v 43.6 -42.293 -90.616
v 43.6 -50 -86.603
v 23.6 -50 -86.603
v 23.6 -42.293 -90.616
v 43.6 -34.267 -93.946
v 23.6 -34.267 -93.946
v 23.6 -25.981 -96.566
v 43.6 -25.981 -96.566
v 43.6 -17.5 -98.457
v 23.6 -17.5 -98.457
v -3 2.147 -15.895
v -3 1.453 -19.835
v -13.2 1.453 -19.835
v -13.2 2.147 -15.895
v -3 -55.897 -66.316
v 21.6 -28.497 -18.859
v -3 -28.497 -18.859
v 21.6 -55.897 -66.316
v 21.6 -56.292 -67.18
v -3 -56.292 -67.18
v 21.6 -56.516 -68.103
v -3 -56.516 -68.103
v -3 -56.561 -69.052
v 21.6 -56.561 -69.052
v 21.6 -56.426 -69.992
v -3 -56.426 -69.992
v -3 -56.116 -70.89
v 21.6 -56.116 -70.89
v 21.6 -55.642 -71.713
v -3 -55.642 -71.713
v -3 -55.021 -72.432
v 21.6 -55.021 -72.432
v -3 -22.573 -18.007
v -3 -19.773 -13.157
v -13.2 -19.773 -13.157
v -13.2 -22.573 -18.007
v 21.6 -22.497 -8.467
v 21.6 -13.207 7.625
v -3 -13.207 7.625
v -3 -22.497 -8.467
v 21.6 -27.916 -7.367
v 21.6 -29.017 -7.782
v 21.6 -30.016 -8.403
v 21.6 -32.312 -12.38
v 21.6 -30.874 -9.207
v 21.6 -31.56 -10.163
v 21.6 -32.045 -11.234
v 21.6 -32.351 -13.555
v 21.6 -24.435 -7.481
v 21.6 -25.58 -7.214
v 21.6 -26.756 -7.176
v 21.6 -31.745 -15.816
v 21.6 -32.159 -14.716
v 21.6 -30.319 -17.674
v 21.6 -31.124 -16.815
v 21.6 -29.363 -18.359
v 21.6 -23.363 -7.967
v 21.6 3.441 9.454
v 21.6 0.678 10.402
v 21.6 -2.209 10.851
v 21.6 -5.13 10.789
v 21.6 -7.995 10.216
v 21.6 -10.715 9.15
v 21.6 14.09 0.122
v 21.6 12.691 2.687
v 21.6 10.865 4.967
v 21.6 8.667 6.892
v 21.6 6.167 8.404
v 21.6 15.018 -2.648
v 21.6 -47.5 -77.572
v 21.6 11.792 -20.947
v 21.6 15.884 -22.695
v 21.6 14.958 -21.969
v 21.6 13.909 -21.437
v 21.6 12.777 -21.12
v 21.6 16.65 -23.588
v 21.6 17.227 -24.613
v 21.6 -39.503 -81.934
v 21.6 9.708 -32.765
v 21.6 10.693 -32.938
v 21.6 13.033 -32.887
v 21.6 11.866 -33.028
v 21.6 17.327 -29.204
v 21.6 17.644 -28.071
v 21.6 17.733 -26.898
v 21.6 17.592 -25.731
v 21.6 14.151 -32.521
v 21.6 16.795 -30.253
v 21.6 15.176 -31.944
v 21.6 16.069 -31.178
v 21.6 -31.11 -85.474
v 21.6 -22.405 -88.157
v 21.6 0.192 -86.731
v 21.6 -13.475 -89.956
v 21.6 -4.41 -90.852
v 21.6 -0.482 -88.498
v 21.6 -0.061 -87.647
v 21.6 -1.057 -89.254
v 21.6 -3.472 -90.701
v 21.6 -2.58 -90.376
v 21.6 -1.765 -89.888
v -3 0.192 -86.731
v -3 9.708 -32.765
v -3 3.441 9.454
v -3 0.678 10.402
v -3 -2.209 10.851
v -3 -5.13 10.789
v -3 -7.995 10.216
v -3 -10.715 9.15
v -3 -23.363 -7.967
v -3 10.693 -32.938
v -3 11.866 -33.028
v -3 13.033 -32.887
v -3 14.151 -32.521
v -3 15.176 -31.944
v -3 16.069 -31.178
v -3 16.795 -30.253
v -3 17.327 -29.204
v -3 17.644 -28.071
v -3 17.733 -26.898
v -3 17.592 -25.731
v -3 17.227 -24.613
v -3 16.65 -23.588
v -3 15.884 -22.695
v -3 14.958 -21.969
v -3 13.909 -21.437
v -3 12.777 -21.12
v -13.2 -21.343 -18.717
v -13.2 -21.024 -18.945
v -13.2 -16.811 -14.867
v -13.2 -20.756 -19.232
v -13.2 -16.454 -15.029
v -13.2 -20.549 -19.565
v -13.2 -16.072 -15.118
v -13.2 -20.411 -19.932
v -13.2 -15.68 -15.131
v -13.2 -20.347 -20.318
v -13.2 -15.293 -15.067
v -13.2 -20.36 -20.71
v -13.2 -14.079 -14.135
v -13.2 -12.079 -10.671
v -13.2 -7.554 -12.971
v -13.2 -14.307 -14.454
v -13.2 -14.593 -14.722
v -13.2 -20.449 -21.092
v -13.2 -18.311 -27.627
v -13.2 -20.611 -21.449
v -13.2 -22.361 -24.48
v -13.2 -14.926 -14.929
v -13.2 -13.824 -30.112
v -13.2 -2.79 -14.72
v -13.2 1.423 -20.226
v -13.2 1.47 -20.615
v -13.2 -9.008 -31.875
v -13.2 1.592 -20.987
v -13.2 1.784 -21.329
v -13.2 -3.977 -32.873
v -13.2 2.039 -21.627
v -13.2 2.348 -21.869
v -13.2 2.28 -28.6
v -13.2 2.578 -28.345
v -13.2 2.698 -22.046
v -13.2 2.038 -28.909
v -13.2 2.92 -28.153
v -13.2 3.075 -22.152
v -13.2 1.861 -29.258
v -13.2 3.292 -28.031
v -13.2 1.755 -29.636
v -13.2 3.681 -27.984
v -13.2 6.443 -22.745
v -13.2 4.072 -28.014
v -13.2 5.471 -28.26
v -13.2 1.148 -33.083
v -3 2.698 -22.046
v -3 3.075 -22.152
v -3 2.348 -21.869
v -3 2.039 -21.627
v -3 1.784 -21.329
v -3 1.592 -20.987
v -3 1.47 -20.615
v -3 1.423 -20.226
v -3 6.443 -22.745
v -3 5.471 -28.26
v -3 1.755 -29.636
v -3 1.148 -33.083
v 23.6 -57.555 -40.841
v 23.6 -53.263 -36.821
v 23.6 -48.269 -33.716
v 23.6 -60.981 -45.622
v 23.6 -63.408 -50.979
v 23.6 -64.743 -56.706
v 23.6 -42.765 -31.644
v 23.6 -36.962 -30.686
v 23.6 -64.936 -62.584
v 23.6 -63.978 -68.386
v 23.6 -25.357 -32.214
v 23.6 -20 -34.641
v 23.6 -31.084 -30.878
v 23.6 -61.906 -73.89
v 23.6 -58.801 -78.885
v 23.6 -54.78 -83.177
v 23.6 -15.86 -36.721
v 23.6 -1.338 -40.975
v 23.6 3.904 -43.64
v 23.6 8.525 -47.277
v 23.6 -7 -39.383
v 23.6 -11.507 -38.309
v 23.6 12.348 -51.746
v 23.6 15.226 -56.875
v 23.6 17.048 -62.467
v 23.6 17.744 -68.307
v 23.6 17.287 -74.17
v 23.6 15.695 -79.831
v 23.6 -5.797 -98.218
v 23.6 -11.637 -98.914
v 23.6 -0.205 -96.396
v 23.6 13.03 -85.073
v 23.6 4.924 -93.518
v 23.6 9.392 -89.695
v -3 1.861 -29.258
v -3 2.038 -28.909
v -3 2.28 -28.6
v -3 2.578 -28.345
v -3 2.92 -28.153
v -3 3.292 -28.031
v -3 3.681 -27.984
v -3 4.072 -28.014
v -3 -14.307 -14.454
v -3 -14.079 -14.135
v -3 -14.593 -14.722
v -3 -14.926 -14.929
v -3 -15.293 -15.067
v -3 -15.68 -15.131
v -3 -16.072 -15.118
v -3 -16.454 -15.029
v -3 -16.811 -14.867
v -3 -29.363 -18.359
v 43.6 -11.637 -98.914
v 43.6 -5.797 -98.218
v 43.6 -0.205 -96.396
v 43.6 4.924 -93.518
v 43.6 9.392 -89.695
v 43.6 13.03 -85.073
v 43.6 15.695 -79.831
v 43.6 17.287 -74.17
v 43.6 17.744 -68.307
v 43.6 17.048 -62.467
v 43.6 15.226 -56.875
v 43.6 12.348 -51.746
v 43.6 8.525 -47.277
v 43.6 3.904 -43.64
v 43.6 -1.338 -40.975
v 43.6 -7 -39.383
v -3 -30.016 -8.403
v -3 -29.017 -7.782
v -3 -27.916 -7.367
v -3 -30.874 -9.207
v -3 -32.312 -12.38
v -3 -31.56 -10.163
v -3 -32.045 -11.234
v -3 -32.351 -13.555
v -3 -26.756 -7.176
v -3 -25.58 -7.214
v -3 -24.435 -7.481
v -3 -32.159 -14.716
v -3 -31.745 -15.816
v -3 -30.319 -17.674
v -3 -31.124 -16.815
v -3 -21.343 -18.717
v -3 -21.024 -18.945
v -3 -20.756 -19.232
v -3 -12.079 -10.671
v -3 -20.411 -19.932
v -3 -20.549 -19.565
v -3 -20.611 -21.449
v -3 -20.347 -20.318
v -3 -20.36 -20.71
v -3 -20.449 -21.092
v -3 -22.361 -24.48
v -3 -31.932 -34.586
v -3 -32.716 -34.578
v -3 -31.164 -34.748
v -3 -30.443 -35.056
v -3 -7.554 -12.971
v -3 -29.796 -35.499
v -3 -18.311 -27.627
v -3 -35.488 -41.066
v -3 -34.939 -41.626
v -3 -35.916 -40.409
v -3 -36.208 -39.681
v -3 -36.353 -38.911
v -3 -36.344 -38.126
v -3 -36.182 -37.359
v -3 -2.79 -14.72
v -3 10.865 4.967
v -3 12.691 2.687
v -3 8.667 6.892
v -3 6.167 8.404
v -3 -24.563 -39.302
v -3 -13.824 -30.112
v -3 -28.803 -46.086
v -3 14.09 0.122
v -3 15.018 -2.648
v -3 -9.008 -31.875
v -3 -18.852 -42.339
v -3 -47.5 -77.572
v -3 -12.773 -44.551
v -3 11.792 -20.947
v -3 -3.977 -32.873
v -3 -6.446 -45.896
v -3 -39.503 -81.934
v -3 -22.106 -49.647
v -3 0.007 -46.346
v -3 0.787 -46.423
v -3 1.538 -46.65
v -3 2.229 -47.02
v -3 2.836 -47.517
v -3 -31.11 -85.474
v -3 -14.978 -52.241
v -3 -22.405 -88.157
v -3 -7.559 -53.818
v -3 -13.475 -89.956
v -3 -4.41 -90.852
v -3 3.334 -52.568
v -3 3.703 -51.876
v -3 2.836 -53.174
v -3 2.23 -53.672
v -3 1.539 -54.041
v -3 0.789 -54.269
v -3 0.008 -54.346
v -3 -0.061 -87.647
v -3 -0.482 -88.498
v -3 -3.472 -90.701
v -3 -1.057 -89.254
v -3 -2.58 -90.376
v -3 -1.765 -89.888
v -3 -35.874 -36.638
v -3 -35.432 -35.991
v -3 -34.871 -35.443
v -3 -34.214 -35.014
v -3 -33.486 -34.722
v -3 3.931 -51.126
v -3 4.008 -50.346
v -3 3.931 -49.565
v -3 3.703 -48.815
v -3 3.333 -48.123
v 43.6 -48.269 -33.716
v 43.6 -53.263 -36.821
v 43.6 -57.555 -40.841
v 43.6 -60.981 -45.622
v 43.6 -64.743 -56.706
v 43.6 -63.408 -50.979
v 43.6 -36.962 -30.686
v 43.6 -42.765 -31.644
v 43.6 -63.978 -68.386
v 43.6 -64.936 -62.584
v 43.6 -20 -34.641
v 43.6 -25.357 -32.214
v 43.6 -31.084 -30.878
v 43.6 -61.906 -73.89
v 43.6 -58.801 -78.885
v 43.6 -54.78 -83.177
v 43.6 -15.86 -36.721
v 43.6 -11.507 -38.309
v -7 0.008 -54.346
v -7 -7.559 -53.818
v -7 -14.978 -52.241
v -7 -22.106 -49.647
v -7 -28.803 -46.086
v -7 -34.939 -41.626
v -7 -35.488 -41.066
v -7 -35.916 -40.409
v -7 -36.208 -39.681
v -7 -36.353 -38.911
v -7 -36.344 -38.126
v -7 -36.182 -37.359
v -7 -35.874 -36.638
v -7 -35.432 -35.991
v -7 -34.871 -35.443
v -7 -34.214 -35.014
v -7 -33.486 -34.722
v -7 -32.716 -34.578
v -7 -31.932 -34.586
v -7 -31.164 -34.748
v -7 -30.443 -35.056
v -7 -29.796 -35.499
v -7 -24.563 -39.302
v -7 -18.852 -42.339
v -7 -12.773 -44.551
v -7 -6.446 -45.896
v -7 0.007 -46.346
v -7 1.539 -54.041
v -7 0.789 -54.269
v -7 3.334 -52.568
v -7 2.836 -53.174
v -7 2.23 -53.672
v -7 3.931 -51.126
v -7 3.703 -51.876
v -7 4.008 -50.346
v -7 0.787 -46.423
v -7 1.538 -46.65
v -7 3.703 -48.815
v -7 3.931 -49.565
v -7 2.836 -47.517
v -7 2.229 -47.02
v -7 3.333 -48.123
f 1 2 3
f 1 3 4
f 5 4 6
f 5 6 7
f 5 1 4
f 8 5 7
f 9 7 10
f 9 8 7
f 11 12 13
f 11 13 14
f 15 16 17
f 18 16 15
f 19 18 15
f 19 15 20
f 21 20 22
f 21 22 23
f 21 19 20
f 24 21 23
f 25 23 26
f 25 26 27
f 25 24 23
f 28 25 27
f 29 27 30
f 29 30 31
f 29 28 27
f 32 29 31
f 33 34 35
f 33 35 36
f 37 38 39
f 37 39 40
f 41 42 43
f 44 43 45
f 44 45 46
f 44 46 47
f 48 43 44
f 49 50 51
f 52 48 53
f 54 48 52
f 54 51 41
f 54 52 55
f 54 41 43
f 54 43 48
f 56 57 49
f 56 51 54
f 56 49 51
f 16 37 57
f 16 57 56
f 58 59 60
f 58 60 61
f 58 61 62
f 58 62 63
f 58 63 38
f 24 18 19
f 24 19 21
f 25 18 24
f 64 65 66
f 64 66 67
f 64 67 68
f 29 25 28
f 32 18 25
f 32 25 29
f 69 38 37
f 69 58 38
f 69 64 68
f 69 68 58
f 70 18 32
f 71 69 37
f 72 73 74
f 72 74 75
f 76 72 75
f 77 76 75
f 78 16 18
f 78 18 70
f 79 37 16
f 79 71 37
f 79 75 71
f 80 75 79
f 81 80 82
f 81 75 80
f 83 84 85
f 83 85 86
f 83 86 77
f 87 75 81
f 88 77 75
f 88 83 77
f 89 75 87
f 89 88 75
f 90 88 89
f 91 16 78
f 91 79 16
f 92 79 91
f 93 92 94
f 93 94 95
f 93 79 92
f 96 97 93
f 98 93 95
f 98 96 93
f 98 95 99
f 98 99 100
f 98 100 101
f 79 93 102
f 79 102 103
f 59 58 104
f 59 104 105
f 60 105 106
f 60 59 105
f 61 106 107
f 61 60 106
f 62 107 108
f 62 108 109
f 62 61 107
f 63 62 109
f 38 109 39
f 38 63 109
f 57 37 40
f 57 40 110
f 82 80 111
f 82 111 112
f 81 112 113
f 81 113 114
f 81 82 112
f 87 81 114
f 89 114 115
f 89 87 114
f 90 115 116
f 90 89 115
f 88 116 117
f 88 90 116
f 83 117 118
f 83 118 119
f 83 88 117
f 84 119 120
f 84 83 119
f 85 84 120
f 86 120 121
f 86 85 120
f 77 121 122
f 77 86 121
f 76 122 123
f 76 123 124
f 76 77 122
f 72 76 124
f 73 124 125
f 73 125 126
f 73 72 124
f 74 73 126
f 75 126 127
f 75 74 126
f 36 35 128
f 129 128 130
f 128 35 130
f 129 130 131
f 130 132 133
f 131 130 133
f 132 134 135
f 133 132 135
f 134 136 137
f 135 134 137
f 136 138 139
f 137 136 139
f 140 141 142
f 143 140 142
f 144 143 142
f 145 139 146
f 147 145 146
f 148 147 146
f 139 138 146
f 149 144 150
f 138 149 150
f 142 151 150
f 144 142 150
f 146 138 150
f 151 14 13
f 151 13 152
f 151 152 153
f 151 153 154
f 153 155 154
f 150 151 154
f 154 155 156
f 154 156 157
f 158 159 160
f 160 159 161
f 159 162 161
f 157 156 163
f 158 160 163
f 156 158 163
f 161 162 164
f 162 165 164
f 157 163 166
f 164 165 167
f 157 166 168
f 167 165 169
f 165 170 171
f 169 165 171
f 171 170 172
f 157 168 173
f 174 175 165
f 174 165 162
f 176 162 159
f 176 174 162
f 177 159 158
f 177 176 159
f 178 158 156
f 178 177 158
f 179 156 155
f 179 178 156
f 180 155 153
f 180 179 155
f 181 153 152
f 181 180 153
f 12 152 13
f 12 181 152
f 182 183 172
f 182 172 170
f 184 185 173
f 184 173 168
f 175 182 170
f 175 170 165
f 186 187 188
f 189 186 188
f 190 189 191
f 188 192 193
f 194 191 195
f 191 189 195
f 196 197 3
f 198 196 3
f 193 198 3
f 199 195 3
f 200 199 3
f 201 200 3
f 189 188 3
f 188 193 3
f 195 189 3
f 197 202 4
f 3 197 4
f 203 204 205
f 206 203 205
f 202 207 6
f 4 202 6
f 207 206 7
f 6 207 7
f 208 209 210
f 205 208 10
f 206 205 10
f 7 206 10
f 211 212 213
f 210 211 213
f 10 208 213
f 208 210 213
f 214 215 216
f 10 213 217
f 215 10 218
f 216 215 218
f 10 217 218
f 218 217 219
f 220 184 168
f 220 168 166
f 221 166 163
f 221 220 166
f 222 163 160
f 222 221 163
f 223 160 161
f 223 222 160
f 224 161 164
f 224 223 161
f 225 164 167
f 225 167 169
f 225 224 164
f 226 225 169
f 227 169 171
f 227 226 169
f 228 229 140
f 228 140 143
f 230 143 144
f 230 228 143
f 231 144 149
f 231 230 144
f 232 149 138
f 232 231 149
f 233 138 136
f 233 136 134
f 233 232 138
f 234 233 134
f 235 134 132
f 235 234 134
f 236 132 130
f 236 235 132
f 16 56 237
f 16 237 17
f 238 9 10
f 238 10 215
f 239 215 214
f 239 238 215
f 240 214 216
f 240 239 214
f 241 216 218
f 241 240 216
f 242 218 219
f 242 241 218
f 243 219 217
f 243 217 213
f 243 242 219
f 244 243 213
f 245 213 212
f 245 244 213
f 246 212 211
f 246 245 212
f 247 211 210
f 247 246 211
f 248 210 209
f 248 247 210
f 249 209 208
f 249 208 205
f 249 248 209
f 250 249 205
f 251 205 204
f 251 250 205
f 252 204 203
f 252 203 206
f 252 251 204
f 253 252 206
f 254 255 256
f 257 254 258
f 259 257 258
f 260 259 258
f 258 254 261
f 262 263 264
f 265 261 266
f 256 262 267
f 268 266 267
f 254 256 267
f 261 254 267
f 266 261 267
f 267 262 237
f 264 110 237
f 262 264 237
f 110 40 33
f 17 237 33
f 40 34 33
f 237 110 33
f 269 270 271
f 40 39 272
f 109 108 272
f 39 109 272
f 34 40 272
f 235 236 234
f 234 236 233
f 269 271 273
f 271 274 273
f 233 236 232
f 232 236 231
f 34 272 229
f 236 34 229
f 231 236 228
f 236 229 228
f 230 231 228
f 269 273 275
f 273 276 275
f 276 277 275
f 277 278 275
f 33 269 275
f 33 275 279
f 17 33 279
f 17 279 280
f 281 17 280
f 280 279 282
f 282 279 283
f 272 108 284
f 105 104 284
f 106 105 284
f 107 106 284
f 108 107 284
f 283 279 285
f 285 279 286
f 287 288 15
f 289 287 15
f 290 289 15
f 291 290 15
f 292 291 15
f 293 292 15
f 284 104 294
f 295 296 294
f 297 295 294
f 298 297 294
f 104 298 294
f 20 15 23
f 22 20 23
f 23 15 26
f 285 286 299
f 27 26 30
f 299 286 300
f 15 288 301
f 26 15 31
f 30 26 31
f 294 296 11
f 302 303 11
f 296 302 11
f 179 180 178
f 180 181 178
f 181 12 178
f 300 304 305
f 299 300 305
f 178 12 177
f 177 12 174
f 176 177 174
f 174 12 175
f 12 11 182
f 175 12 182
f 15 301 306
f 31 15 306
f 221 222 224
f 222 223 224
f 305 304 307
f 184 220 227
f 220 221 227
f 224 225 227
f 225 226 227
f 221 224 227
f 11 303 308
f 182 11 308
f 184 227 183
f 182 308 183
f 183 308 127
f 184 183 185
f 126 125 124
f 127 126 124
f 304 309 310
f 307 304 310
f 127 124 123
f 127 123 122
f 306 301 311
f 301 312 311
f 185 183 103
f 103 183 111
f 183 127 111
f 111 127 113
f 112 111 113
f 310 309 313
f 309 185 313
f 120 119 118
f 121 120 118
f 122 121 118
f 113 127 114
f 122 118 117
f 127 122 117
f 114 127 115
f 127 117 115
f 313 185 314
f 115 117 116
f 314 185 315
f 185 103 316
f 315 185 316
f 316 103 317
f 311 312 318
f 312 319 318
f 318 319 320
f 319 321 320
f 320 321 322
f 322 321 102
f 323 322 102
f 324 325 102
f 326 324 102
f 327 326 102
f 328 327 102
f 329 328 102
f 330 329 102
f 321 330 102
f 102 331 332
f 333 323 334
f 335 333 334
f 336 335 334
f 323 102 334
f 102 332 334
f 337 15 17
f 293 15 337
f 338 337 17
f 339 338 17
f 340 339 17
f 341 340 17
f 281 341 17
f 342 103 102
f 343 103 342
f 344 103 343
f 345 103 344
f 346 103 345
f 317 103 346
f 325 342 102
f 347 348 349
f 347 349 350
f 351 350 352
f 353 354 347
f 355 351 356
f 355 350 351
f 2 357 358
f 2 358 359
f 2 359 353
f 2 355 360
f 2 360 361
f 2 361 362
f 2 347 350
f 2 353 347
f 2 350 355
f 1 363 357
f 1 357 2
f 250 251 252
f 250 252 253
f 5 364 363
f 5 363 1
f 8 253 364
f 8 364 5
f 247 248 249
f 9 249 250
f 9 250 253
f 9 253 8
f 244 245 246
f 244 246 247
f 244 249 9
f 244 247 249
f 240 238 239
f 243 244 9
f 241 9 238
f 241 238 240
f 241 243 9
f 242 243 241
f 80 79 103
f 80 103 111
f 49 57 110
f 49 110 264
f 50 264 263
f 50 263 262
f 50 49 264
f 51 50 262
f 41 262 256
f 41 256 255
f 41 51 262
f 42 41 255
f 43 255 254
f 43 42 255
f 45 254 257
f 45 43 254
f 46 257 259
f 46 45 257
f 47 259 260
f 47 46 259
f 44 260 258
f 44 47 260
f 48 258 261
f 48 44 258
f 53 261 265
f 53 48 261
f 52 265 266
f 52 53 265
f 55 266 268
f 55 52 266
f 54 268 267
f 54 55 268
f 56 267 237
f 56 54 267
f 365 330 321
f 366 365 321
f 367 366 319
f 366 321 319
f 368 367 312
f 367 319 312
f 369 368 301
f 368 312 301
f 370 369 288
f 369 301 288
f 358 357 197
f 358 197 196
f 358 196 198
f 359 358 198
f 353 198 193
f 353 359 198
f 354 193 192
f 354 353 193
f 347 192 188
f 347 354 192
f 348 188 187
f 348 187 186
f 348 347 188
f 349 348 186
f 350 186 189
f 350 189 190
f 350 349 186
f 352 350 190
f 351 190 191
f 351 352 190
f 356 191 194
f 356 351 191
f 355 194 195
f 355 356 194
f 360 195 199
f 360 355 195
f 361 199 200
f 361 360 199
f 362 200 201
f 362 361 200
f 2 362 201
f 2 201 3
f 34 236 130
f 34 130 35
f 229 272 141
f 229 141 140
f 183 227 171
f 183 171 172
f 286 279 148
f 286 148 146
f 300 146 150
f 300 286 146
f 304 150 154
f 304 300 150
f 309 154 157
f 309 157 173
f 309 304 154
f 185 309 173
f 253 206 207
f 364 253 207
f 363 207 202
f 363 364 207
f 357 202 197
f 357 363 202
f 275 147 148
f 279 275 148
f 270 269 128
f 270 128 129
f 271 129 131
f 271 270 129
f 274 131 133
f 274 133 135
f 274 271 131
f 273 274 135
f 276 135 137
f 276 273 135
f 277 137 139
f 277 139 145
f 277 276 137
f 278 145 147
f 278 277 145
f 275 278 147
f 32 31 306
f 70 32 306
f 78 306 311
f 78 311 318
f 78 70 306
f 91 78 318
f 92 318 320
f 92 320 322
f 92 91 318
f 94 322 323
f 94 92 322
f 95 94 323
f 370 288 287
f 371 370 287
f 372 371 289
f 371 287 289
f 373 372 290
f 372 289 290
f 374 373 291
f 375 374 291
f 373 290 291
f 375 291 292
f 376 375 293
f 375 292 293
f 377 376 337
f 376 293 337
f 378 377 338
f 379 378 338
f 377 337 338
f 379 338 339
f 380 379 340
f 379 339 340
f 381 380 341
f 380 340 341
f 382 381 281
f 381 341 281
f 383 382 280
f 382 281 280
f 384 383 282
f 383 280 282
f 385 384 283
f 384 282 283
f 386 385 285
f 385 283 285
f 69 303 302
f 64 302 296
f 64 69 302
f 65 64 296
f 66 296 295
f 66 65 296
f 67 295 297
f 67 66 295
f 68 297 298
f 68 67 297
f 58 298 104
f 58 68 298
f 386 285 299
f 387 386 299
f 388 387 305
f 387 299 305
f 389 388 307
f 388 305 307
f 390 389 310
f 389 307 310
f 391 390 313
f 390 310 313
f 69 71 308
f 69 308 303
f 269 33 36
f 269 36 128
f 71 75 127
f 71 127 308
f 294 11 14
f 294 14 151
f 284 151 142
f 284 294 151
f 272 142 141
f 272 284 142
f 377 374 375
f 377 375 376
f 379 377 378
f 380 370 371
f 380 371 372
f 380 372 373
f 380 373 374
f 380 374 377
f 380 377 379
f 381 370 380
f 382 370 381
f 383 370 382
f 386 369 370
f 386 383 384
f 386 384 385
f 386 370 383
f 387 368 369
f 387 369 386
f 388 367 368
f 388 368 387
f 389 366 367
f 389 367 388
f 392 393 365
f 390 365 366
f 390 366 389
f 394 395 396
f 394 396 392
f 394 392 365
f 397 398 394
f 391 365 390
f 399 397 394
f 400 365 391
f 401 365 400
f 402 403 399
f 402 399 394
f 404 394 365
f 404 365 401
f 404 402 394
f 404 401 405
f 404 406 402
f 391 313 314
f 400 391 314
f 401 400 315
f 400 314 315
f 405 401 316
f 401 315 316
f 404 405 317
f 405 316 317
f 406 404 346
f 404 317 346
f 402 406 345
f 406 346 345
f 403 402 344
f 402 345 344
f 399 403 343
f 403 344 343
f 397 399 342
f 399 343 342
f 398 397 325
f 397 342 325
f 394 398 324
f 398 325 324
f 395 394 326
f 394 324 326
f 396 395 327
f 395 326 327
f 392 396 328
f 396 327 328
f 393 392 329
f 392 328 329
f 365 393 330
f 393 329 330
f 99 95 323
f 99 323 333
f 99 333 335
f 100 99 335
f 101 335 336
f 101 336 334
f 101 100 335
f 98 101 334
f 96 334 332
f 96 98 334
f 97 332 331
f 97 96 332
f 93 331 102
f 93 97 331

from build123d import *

# Parameters (mm, degrees)
BOSS_EXTRUDE2_DEPTH = 24.6
BOSS_EXTRUDE3_DEPTH = 4
BOSS_EXTRUDE4_DEPTH = 10.2
BOSS_EXTRUDE5_DEPTH = 20


with BuildPart() as part:
    # Sketch7 → Boss-Extrude2 (new body)
    with BuildSketch(Plane(origin=(21.6, 0, 0), x_dir=(0, 0, -1), z_dir=(1, 0, 0))):
        with BuildLine():
            Line((-7.625, -13.206887408), (8.466613981, -22.497385071))
            Line((8.466613981, -22.497385071), (7.966613981, -23.363410475))
            ThreePointArc((7.966613981, -23.363410475), (10.162766404, -31.559562898), (18.358918826, -29.363410475))
            Line((18.358918826, -29.363410475), (18.858918826, -28.497385071))
            Line((18.858918826, -28.497385071), (66.316248975, -55.896887408))
            ThreePointArc((66.316248975, -55.896887408), (69.52544748, -56.516208588), (72.431605073, -55.020627828))
            ThreePointArc((72.431605073, -55.020627828), (85.473848311, -31.109936594), (90.852406417, -4.409892086))
            ThreePointArc((90.852406417, -4.409892086), (89.587501324, -1.396168663), (86.731020662, 0.192236824))
            Line((86.731020662, 0.192236824), (32.764536002, 9.707984124))
            Line((32.764536002, 9.707984124), (32.93818418, 10.692791877))
            ThreePointArc((32.93818418, 10.692791877), (28.071226728, 17.643527461), (21.120491144, 12.776570009))
            Line((21.120491144, 12.776570009), (20.946842966, 11.791762256))
            Line((20.946842966, 11.791762256), (2.648134709, 15.018318233))
            ThreePointArc((2.648134709, 15.018318233), (-4.966977399, 10.864576659), (-9.454073405, 3.441001312))
            ThreePointArc((-9.454073405, 3.441001312), (-10.788540697, -5.130037047), (-7.625, -13.206887408))
        make_face()
    extrude(amount=-BOSS_EXTRUDE2_DEPTH)

    # Sketch10 → Boss-Extrude3 (add)
    with BuildSketch(Plane.ZY.offset(3)):
        with BuildLine():
            ThreePointArc((-54.346189903, 0.008194309), (-51.068714201, -18.587491871), (-41.62632958, -34.939334709))
            ThreePointArc((-41.62632958, -34.939334709), (-35.990927094, -35.431512343), (-35.49874946, -29.796109857))
            ThreePointArc((-35.49874946, -29.796109857), (-43.551173234, -15.851330725), (-46.346189994, 0.006988071))
            ThreePointArc((-46.346189994, 0.006988071), (-50.34558683, 4.007591145), (-54.346189903, 0.008194309))
        make_face()
    extrude(amount=BOSS_EXTRUDE3_DEPTH)

    # Sketch13 → Boss-Extrude4 (add)
    with BuildSketch(Plane.ZY.offset(3)):
        with BuildLine():
            Line((-10.671230148, -12.078877858), (-14.135331763, -14.078877858))
            ThreePointArc((-14.135331763, -14.078877858), (-15.067183416, -15.293290575), (-14.867382571, -16.810928665))
            Line((-14.867382571, -16.810928665), (-13.157382571, -19.772735546))
            Line((-13.157382571, -19.772735546), (-18.007124832, -22.572735546))
            Line((-18.007124832, -22.572735546), (-18.717124832, -21.342979473))
            ThreePointArc((-18.717124832, -21.342979473), (-19.93153755, -20.41112782), (-21.44917564, -20.610928665))
            Line((-21.44917564, -20.610928665), (-24.480264553, -22.360928665))
            ThreePointArc((-24.480264553, -22.360928665), (-31.086634735, -11.450140853), (-33.08288647, 1.147652472))
            Line((-33.08288647, 1.147652472), (-29.636059334, 1.755421094))
            ThreePointArc((-29.636059334, 1.755421094), (-28.345051601, 2.577883728), (-28.013740184, 4.072332956))
            Line((-28.013740184, 4.072332956), (-28.260320596, 5.470759965))
            Line((-28.260320596, 5.470759965), (-22.745397179, 6.44318976))
            Line((-22.745397179, 6.44318976), (-22.151520411, 3.075147244))
            ThreePointArc((-22.151520411, 3.075147244), (-21.329057778, 1.784139511), (-19.83460855, 1.452828094))
            Line((-19.83460855, 1.452828094), (-15.895377538, 2.147420804))
            ThreePointArc((-15.895377538, 2.147420804), (-13.915890879, -5.198025626), (-10.671230148, -12.078877858))
        make_face()
    extrude(amount=BOSS_EXTRUDE4_DEPTH)


with BuildPart() as body_2:
    # Sketch14 → Boss-Extrude5 (new body)
    with BuildSketch(Plane(origin=(43.6, 0, 0), x_dir=(0, 0, -1), z_dir=(1, 0, 0))):
        with BuildLine():
            ThreePointArc((98.456843338, -17.5), (74.169790336, 17.287053001), (39.382737335, -7))
            ThreePointArc((39.382737335, -7), (37.578305178, -13.706603516), (34.641016151, -20))
            ThreePointArc((34.641016151, -20), (45.621778265, -60.980762114), (86.602540378, -50))
            ThreePointArc((86.602540378, -50), (93.945762945, -34.26650879), (98.456843338, -17.5))
        make_face()
    extrude(amount=-BOSS_EXTRUDE5_DEPTH)


solid = Compound([part.part, body_2.part])
